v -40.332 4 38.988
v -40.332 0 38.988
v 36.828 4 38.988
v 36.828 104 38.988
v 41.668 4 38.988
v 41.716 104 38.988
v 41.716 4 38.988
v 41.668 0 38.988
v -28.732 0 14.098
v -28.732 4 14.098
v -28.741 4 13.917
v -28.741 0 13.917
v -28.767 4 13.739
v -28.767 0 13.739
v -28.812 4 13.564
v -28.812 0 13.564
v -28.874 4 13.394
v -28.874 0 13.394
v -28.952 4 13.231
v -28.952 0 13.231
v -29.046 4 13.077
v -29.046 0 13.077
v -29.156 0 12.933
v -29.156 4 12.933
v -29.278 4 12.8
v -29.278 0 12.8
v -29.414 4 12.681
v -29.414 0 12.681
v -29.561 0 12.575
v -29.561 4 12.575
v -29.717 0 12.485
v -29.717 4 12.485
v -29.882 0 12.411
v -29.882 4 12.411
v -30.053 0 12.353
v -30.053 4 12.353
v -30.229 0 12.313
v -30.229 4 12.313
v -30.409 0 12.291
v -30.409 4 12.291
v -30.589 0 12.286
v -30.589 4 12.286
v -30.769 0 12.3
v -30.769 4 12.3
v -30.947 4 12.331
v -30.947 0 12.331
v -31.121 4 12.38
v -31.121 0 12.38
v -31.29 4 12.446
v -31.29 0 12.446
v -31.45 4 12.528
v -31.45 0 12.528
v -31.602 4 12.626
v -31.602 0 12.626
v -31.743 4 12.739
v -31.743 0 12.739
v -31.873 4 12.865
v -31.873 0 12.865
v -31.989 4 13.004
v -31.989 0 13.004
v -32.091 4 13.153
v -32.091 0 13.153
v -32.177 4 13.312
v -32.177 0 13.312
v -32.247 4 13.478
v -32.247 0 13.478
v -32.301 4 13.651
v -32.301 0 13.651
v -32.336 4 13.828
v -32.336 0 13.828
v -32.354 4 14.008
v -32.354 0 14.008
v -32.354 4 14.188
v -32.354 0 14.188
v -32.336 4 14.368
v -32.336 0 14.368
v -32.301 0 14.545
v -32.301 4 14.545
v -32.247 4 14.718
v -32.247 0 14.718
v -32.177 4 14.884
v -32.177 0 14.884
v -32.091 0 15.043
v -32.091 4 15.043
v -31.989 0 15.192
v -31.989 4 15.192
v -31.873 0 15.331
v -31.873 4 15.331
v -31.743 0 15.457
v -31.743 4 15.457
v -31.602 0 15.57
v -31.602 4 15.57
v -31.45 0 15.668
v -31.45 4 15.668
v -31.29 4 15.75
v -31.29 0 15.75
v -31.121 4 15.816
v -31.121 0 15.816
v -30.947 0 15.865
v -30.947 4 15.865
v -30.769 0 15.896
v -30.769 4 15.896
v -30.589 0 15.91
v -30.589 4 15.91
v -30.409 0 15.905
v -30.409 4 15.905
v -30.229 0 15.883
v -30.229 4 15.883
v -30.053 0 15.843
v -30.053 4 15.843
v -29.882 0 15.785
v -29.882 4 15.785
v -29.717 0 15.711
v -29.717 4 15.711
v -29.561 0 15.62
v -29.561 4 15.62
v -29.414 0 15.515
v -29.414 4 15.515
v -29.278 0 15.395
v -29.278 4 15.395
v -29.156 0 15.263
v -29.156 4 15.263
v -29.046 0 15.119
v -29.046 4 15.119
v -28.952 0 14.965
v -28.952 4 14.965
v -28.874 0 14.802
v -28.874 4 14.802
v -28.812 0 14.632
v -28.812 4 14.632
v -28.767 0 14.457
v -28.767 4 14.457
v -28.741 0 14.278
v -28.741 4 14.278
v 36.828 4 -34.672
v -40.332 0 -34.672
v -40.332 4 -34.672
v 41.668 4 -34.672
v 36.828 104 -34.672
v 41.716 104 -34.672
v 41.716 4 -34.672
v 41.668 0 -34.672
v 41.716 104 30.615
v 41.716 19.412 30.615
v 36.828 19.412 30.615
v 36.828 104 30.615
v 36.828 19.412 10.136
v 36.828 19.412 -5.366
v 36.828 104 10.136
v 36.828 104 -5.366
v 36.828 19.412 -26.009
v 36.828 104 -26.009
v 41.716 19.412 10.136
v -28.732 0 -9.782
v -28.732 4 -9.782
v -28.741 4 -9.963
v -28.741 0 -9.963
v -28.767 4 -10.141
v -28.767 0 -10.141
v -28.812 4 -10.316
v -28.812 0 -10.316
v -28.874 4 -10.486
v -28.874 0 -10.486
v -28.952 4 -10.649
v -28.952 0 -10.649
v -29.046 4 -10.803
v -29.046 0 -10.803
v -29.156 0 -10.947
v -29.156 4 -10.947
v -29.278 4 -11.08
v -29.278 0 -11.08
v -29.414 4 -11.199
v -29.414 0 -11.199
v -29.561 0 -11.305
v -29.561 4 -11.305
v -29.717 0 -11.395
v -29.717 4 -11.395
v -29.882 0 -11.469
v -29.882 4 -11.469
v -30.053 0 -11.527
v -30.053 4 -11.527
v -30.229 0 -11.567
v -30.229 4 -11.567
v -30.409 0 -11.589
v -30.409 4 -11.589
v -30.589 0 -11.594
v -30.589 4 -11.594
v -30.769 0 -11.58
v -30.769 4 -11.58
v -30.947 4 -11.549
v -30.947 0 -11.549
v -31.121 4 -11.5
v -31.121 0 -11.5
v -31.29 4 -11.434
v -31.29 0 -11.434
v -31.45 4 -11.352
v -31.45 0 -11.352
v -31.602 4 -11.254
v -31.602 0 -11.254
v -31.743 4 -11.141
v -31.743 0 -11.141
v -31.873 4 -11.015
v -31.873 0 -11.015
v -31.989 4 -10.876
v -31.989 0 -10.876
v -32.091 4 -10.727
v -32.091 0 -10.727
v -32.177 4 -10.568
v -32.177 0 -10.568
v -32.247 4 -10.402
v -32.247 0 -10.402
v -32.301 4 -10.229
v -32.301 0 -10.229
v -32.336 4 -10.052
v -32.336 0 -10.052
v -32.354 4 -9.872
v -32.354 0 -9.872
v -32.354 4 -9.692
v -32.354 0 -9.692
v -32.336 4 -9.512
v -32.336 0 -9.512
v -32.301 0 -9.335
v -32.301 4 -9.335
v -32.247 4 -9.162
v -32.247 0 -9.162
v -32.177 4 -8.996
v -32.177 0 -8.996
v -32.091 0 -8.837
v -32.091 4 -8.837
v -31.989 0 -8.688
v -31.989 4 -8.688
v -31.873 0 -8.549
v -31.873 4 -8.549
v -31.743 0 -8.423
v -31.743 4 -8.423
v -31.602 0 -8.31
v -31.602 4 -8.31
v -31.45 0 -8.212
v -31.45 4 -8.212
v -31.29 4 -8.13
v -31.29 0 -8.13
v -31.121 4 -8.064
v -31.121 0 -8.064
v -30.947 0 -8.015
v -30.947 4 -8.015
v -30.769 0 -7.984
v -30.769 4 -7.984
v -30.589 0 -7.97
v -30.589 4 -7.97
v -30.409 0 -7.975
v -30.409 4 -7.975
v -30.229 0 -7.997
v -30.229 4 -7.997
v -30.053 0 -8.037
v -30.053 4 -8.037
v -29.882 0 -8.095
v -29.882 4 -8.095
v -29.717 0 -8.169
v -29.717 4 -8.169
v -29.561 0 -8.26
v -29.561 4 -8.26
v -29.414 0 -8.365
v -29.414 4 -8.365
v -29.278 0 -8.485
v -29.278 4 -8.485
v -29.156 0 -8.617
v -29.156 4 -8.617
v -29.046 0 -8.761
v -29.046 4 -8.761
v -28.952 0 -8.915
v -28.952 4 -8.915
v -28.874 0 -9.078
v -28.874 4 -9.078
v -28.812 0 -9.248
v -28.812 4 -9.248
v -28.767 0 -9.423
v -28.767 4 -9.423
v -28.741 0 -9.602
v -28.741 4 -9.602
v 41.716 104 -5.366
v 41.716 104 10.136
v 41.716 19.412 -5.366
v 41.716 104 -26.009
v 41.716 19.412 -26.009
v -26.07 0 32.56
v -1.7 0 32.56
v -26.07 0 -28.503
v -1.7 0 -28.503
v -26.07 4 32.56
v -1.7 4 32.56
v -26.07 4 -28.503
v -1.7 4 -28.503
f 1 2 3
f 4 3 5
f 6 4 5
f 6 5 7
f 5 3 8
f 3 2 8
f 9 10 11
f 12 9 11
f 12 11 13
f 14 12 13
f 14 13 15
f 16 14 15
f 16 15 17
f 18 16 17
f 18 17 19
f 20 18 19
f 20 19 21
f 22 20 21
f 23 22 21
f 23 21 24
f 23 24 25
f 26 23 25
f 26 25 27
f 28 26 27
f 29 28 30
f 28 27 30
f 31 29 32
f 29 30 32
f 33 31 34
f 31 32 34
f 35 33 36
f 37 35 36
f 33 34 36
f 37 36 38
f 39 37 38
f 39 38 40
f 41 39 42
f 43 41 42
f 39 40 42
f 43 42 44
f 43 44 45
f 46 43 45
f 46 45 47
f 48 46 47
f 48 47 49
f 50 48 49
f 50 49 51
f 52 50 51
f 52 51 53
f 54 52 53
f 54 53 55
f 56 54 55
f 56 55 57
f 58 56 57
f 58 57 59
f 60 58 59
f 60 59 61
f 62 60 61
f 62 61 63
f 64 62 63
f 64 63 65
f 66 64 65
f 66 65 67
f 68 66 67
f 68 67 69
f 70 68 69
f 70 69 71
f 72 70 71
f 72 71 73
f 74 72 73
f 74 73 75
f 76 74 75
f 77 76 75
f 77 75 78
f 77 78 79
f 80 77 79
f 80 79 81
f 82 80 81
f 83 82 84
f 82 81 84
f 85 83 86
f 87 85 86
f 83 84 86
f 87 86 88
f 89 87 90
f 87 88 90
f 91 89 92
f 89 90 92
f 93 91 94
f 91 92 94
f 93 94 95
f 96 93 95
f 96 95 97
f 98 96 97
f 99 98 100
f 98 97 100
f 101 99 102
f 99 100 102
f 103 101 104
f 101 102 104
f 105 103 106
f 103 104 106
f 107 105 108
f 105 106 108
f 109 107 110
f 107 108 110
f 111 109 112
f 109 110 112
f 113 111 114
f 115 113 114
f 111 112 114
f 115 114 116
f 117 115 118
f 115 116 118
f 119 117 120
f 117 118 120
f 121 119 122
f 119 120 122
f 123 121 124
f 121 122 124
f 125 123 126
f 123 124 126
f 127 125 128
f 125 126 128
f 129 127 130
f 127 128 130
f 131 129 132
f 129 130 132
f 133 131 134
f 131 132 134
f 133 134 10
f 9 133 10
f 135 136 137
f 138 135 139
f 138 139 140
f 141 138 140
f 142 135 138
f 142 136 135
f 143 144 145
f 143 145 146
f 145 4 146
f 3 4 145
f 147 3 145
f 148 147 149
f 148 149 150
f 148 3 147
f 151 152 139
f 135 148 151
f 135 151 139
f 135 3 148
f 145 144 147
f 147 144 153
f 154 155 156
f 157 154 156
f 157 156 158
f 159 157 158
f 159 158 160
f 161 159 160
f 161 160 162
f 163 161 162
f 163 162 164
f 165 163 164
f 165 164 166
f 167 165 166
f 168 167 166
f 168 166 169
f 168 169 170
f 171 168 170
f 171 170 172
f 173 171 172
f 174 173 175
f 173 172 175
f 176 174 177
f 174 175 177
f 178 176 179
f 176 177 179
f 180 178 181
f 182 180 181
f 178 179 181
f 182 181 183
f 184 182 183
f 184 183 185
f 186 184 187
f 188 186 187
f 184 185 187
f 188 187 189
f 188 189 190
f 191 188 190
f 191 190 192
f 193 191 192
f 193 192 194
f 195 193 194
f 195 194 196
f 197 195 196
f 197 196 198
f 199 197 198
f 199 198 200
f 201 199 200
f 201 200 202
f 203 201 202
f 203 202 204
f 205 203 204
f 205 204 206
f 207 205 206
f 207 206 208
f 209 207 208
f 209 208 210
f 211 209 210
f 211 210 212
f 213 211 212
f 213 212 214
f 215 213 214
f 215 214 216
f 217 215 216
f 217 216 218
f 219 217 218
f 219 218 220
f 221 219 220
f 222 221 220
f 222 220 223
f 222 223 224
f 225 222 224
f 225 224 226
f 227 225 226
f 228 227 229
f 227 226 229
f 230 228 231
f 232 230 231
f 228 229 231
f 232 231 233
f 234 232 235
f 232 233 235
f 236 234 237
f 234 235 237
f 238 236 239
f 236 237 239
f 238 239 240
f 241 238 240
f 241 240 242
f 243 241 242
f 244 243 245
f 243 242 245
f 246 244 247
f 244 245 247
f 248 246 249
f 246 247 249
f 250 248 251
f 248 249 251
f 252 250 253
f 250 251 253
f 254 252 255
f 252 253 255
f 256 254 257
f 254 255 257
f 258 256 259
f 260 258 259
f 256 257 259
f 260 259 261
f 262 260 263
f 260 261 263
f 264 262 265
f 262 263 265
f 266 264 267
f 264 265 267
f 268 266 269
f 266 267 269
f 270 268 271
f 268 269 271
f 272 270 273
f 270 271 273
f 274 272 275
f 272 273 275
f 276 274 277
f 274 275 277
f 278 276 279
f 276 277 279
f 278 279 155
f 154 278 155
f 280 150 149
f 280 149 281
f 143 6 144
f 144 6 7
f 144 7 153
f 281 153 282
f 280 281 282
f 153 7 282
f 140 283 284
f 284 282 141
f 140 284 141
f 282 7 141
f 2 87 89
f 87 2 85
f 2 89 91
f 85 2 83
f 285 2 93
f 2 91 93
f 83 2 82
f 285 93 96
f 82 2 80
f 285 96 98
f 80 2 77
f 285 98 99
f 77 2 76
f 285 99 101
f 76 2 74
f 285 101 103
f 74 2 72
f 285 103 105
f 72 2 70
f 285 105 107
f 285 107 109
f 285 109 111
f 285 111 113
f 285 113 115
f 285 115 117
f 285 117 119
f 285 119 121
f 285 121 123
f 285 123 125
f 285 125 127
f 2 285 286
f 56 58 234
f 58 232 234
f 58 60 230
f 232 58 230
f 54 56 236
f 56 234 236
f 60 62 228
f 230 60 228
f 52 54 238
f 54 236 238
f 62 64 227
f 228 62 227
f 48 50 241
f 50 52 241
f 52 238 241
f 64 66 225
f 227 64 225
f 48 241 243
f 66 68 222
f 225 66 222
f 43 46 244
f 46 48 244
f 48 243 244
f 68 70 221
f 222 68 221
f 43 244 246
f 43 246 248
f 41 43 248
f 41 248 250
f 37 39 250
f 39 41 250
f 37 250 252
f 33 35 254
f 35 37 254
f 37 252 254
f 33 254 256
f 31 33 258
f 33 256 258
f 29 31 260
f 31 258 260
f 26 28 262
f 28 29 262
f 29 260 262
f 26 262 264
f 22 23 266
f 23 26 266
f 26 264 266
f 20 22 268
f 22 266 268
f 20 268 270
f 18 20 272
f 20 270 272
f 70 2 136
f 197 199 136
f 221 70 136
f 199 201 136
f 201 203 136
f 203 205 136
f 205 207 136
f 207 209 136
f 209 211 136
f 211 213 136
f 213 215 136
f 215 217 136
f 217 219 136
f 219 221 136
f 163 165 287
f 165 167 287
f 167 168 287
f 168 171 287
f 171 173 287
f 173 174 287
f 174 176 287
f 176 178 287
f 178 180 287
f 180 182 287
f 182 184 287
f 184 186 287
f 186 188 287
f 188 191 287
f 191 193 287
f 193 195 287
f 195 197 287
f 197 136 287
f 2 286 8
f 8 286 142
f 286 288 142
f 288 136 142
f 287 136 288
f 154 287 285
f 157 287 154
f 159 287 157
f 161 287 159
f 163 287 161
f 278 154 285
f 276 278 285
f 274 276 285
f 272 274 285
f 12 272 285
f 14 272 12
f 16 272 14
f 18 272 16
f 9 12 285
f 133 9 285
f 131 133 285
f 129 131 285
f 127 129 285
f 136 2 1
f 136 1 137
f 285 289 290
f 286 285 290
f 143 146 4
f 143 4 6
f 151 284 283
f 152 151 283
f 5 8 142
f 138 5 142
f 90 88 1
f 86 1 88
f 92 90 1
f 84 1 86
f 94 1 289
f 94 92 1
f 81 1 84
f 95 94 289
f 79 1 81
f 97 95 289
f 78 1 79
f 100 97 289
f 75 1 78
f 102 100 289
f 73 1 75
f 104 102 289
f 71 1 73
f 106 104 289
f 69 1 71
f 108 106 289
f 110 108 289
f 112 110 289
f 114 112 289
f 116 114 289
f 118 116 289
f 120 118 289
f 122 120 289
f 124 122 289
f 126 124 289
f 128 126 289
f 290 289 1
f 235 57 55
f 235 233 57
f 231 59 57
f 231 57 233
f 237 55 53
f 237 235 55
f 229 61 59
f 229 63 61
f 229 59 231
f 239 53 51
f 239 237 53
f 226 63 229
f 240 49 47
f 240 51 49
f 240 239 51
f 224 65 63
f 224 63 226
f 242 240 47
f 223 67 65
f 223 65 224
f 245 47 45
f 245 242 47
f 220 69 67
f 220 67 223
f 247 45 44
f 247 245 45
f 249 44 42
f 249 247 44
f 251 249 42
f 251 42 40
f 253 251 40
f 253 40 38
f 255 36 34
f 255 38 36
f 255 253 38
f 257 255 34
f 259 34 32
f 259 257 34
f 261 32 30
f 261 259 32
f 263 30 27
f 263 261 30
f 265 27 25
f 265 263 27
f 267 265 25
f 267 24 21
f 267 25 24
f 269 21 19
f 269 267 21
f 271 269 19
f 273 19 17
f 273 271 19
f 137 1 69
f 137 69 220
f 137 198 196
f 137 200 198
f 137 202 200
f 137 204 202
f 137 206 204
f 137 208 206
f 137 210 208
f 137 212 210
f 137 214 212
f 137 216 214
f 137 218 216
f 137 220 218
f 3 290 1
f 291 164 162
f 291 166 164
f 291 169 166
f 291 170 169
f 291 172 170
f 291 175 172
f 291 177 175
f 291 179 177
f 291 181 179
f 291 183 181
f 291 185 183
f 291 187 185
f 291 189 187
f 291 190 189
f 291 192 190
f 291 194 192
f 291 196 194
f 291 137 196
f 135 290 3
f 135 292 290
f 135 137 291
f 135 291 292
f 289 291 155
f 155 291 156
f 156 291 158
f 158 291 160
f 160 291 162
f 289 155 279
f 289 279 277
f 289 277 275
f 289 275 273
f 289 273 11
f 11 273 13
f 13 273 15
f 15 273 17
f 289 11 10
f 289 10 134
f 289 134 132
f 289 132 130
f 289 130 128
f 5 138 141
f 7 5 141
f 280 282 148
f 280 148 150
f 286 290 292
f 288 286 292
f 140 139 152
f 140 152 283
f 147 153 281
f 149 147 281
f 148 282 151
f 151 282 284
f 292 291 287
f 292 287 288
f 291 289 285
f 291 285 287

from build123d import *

# Parameters (mm, degrees)
SKETCH1_W           = 82
SKETCH1_H           = 73.66
BOSS_EXTRUDE1_DEPTH = 4
SKETCH2_W           = 4.88717895
SKETCH2_H           = 73.66
BOSS_EXTRUDE2_DEPTH = 100
SKETCH3_R           = 1.8125
CUT_EXTRUDE1_DEPTH  = 10
SKETCH4_W           = 24.37
SKETCH4_H           = 61.062715067
CUT_EXTRUDE2_DEPTH  = 10
SKETCH5_W           = 20.642645576
SKETCH5_H           = 101.129835632
SKETCH5_W_2         = 20.479187661
SKETCH5_H_2         = 100.180376076
CUT_EXTRUDE3_DEPTH  = 10


with BuildPart() as part:
    # Sketch1 → Boss-Extrude1 (new body)
    with BuildSketch(Plane(origin=(0, 0, 0), x_dir=(1, 0, 0), z_dir=(0, 1, 0))):
        with Locations((0.667646454, -2.157941762)):
            Rectangle(SKETCH1_W, SKETCH1_H)
    extrude(amount=BOSS_EXTRUDE1_DEPTH)

    # Sketch2 → Boss-Extrude2 (add)
    with BuildSketch(Plane(origin=(0, 4, 0), x_dir=(1, 0, 0), z_dir=(0, 1, 0))):
        with Locations((39.271911138, -2.157941762)):
            Rectangle(SKETCH2_W, SKETCH2_H)
    extrude(amount=BOSS_EXTRUDE2_DEPTH)

    # Sketch3 → Cut-Extrude1 (cut)
    with BuildSketch(Plane(origin=(0, 4, 0), x_dir=(1, 0, 0), z_dir=(0, 1, 0))):
        with Locations((-30.544050148, 9.782058238)):
            Circle(SKETCH3_R)
        with Locations((-30.544050148, -14.097941762)):
            Circle(SKETCH3_R)
    extrude(amount=-CUT_EXTRUDE1_DEPTH, mode=Mode.SUBTRACT)

    # Sketch4 → Cut-Extrude2 (cut)
    with BuildSketch(Plane(origin=(0, 4, 0), x_dir=(1, 0, 0), z_dir=(0, 1, 0))):
        with Locations((-13.885112628, -2.028636366)):
            Rectangle(SKETCH4_W, SKETCH4_H)
    extrude(amount=-CUT_EXTRUDE2_DEPTH, mode=Mode.SUBTRACT)

    # Sketch5 → Cut-Extrude3 (cut)
    with BuildSketch(Plane(origin=(41.715500613, 0, 0), x_dir=(0, 0, -1), z_dir=(1, 0, 0))):
        with Locations((15.687392669, 69.976580633)):
            Rectangle(SKETCH5_W, SKETCH5_H)
        with Locations((-20.375345347, 69.501850855)):
            Rectangle(SKETCH5_W_2, SKETCH5_H_2)
    extrude(amount=-CUT_EXTRUDE3_DEPTH, mode=Mode.SUBTRACT)


solid = part.part
